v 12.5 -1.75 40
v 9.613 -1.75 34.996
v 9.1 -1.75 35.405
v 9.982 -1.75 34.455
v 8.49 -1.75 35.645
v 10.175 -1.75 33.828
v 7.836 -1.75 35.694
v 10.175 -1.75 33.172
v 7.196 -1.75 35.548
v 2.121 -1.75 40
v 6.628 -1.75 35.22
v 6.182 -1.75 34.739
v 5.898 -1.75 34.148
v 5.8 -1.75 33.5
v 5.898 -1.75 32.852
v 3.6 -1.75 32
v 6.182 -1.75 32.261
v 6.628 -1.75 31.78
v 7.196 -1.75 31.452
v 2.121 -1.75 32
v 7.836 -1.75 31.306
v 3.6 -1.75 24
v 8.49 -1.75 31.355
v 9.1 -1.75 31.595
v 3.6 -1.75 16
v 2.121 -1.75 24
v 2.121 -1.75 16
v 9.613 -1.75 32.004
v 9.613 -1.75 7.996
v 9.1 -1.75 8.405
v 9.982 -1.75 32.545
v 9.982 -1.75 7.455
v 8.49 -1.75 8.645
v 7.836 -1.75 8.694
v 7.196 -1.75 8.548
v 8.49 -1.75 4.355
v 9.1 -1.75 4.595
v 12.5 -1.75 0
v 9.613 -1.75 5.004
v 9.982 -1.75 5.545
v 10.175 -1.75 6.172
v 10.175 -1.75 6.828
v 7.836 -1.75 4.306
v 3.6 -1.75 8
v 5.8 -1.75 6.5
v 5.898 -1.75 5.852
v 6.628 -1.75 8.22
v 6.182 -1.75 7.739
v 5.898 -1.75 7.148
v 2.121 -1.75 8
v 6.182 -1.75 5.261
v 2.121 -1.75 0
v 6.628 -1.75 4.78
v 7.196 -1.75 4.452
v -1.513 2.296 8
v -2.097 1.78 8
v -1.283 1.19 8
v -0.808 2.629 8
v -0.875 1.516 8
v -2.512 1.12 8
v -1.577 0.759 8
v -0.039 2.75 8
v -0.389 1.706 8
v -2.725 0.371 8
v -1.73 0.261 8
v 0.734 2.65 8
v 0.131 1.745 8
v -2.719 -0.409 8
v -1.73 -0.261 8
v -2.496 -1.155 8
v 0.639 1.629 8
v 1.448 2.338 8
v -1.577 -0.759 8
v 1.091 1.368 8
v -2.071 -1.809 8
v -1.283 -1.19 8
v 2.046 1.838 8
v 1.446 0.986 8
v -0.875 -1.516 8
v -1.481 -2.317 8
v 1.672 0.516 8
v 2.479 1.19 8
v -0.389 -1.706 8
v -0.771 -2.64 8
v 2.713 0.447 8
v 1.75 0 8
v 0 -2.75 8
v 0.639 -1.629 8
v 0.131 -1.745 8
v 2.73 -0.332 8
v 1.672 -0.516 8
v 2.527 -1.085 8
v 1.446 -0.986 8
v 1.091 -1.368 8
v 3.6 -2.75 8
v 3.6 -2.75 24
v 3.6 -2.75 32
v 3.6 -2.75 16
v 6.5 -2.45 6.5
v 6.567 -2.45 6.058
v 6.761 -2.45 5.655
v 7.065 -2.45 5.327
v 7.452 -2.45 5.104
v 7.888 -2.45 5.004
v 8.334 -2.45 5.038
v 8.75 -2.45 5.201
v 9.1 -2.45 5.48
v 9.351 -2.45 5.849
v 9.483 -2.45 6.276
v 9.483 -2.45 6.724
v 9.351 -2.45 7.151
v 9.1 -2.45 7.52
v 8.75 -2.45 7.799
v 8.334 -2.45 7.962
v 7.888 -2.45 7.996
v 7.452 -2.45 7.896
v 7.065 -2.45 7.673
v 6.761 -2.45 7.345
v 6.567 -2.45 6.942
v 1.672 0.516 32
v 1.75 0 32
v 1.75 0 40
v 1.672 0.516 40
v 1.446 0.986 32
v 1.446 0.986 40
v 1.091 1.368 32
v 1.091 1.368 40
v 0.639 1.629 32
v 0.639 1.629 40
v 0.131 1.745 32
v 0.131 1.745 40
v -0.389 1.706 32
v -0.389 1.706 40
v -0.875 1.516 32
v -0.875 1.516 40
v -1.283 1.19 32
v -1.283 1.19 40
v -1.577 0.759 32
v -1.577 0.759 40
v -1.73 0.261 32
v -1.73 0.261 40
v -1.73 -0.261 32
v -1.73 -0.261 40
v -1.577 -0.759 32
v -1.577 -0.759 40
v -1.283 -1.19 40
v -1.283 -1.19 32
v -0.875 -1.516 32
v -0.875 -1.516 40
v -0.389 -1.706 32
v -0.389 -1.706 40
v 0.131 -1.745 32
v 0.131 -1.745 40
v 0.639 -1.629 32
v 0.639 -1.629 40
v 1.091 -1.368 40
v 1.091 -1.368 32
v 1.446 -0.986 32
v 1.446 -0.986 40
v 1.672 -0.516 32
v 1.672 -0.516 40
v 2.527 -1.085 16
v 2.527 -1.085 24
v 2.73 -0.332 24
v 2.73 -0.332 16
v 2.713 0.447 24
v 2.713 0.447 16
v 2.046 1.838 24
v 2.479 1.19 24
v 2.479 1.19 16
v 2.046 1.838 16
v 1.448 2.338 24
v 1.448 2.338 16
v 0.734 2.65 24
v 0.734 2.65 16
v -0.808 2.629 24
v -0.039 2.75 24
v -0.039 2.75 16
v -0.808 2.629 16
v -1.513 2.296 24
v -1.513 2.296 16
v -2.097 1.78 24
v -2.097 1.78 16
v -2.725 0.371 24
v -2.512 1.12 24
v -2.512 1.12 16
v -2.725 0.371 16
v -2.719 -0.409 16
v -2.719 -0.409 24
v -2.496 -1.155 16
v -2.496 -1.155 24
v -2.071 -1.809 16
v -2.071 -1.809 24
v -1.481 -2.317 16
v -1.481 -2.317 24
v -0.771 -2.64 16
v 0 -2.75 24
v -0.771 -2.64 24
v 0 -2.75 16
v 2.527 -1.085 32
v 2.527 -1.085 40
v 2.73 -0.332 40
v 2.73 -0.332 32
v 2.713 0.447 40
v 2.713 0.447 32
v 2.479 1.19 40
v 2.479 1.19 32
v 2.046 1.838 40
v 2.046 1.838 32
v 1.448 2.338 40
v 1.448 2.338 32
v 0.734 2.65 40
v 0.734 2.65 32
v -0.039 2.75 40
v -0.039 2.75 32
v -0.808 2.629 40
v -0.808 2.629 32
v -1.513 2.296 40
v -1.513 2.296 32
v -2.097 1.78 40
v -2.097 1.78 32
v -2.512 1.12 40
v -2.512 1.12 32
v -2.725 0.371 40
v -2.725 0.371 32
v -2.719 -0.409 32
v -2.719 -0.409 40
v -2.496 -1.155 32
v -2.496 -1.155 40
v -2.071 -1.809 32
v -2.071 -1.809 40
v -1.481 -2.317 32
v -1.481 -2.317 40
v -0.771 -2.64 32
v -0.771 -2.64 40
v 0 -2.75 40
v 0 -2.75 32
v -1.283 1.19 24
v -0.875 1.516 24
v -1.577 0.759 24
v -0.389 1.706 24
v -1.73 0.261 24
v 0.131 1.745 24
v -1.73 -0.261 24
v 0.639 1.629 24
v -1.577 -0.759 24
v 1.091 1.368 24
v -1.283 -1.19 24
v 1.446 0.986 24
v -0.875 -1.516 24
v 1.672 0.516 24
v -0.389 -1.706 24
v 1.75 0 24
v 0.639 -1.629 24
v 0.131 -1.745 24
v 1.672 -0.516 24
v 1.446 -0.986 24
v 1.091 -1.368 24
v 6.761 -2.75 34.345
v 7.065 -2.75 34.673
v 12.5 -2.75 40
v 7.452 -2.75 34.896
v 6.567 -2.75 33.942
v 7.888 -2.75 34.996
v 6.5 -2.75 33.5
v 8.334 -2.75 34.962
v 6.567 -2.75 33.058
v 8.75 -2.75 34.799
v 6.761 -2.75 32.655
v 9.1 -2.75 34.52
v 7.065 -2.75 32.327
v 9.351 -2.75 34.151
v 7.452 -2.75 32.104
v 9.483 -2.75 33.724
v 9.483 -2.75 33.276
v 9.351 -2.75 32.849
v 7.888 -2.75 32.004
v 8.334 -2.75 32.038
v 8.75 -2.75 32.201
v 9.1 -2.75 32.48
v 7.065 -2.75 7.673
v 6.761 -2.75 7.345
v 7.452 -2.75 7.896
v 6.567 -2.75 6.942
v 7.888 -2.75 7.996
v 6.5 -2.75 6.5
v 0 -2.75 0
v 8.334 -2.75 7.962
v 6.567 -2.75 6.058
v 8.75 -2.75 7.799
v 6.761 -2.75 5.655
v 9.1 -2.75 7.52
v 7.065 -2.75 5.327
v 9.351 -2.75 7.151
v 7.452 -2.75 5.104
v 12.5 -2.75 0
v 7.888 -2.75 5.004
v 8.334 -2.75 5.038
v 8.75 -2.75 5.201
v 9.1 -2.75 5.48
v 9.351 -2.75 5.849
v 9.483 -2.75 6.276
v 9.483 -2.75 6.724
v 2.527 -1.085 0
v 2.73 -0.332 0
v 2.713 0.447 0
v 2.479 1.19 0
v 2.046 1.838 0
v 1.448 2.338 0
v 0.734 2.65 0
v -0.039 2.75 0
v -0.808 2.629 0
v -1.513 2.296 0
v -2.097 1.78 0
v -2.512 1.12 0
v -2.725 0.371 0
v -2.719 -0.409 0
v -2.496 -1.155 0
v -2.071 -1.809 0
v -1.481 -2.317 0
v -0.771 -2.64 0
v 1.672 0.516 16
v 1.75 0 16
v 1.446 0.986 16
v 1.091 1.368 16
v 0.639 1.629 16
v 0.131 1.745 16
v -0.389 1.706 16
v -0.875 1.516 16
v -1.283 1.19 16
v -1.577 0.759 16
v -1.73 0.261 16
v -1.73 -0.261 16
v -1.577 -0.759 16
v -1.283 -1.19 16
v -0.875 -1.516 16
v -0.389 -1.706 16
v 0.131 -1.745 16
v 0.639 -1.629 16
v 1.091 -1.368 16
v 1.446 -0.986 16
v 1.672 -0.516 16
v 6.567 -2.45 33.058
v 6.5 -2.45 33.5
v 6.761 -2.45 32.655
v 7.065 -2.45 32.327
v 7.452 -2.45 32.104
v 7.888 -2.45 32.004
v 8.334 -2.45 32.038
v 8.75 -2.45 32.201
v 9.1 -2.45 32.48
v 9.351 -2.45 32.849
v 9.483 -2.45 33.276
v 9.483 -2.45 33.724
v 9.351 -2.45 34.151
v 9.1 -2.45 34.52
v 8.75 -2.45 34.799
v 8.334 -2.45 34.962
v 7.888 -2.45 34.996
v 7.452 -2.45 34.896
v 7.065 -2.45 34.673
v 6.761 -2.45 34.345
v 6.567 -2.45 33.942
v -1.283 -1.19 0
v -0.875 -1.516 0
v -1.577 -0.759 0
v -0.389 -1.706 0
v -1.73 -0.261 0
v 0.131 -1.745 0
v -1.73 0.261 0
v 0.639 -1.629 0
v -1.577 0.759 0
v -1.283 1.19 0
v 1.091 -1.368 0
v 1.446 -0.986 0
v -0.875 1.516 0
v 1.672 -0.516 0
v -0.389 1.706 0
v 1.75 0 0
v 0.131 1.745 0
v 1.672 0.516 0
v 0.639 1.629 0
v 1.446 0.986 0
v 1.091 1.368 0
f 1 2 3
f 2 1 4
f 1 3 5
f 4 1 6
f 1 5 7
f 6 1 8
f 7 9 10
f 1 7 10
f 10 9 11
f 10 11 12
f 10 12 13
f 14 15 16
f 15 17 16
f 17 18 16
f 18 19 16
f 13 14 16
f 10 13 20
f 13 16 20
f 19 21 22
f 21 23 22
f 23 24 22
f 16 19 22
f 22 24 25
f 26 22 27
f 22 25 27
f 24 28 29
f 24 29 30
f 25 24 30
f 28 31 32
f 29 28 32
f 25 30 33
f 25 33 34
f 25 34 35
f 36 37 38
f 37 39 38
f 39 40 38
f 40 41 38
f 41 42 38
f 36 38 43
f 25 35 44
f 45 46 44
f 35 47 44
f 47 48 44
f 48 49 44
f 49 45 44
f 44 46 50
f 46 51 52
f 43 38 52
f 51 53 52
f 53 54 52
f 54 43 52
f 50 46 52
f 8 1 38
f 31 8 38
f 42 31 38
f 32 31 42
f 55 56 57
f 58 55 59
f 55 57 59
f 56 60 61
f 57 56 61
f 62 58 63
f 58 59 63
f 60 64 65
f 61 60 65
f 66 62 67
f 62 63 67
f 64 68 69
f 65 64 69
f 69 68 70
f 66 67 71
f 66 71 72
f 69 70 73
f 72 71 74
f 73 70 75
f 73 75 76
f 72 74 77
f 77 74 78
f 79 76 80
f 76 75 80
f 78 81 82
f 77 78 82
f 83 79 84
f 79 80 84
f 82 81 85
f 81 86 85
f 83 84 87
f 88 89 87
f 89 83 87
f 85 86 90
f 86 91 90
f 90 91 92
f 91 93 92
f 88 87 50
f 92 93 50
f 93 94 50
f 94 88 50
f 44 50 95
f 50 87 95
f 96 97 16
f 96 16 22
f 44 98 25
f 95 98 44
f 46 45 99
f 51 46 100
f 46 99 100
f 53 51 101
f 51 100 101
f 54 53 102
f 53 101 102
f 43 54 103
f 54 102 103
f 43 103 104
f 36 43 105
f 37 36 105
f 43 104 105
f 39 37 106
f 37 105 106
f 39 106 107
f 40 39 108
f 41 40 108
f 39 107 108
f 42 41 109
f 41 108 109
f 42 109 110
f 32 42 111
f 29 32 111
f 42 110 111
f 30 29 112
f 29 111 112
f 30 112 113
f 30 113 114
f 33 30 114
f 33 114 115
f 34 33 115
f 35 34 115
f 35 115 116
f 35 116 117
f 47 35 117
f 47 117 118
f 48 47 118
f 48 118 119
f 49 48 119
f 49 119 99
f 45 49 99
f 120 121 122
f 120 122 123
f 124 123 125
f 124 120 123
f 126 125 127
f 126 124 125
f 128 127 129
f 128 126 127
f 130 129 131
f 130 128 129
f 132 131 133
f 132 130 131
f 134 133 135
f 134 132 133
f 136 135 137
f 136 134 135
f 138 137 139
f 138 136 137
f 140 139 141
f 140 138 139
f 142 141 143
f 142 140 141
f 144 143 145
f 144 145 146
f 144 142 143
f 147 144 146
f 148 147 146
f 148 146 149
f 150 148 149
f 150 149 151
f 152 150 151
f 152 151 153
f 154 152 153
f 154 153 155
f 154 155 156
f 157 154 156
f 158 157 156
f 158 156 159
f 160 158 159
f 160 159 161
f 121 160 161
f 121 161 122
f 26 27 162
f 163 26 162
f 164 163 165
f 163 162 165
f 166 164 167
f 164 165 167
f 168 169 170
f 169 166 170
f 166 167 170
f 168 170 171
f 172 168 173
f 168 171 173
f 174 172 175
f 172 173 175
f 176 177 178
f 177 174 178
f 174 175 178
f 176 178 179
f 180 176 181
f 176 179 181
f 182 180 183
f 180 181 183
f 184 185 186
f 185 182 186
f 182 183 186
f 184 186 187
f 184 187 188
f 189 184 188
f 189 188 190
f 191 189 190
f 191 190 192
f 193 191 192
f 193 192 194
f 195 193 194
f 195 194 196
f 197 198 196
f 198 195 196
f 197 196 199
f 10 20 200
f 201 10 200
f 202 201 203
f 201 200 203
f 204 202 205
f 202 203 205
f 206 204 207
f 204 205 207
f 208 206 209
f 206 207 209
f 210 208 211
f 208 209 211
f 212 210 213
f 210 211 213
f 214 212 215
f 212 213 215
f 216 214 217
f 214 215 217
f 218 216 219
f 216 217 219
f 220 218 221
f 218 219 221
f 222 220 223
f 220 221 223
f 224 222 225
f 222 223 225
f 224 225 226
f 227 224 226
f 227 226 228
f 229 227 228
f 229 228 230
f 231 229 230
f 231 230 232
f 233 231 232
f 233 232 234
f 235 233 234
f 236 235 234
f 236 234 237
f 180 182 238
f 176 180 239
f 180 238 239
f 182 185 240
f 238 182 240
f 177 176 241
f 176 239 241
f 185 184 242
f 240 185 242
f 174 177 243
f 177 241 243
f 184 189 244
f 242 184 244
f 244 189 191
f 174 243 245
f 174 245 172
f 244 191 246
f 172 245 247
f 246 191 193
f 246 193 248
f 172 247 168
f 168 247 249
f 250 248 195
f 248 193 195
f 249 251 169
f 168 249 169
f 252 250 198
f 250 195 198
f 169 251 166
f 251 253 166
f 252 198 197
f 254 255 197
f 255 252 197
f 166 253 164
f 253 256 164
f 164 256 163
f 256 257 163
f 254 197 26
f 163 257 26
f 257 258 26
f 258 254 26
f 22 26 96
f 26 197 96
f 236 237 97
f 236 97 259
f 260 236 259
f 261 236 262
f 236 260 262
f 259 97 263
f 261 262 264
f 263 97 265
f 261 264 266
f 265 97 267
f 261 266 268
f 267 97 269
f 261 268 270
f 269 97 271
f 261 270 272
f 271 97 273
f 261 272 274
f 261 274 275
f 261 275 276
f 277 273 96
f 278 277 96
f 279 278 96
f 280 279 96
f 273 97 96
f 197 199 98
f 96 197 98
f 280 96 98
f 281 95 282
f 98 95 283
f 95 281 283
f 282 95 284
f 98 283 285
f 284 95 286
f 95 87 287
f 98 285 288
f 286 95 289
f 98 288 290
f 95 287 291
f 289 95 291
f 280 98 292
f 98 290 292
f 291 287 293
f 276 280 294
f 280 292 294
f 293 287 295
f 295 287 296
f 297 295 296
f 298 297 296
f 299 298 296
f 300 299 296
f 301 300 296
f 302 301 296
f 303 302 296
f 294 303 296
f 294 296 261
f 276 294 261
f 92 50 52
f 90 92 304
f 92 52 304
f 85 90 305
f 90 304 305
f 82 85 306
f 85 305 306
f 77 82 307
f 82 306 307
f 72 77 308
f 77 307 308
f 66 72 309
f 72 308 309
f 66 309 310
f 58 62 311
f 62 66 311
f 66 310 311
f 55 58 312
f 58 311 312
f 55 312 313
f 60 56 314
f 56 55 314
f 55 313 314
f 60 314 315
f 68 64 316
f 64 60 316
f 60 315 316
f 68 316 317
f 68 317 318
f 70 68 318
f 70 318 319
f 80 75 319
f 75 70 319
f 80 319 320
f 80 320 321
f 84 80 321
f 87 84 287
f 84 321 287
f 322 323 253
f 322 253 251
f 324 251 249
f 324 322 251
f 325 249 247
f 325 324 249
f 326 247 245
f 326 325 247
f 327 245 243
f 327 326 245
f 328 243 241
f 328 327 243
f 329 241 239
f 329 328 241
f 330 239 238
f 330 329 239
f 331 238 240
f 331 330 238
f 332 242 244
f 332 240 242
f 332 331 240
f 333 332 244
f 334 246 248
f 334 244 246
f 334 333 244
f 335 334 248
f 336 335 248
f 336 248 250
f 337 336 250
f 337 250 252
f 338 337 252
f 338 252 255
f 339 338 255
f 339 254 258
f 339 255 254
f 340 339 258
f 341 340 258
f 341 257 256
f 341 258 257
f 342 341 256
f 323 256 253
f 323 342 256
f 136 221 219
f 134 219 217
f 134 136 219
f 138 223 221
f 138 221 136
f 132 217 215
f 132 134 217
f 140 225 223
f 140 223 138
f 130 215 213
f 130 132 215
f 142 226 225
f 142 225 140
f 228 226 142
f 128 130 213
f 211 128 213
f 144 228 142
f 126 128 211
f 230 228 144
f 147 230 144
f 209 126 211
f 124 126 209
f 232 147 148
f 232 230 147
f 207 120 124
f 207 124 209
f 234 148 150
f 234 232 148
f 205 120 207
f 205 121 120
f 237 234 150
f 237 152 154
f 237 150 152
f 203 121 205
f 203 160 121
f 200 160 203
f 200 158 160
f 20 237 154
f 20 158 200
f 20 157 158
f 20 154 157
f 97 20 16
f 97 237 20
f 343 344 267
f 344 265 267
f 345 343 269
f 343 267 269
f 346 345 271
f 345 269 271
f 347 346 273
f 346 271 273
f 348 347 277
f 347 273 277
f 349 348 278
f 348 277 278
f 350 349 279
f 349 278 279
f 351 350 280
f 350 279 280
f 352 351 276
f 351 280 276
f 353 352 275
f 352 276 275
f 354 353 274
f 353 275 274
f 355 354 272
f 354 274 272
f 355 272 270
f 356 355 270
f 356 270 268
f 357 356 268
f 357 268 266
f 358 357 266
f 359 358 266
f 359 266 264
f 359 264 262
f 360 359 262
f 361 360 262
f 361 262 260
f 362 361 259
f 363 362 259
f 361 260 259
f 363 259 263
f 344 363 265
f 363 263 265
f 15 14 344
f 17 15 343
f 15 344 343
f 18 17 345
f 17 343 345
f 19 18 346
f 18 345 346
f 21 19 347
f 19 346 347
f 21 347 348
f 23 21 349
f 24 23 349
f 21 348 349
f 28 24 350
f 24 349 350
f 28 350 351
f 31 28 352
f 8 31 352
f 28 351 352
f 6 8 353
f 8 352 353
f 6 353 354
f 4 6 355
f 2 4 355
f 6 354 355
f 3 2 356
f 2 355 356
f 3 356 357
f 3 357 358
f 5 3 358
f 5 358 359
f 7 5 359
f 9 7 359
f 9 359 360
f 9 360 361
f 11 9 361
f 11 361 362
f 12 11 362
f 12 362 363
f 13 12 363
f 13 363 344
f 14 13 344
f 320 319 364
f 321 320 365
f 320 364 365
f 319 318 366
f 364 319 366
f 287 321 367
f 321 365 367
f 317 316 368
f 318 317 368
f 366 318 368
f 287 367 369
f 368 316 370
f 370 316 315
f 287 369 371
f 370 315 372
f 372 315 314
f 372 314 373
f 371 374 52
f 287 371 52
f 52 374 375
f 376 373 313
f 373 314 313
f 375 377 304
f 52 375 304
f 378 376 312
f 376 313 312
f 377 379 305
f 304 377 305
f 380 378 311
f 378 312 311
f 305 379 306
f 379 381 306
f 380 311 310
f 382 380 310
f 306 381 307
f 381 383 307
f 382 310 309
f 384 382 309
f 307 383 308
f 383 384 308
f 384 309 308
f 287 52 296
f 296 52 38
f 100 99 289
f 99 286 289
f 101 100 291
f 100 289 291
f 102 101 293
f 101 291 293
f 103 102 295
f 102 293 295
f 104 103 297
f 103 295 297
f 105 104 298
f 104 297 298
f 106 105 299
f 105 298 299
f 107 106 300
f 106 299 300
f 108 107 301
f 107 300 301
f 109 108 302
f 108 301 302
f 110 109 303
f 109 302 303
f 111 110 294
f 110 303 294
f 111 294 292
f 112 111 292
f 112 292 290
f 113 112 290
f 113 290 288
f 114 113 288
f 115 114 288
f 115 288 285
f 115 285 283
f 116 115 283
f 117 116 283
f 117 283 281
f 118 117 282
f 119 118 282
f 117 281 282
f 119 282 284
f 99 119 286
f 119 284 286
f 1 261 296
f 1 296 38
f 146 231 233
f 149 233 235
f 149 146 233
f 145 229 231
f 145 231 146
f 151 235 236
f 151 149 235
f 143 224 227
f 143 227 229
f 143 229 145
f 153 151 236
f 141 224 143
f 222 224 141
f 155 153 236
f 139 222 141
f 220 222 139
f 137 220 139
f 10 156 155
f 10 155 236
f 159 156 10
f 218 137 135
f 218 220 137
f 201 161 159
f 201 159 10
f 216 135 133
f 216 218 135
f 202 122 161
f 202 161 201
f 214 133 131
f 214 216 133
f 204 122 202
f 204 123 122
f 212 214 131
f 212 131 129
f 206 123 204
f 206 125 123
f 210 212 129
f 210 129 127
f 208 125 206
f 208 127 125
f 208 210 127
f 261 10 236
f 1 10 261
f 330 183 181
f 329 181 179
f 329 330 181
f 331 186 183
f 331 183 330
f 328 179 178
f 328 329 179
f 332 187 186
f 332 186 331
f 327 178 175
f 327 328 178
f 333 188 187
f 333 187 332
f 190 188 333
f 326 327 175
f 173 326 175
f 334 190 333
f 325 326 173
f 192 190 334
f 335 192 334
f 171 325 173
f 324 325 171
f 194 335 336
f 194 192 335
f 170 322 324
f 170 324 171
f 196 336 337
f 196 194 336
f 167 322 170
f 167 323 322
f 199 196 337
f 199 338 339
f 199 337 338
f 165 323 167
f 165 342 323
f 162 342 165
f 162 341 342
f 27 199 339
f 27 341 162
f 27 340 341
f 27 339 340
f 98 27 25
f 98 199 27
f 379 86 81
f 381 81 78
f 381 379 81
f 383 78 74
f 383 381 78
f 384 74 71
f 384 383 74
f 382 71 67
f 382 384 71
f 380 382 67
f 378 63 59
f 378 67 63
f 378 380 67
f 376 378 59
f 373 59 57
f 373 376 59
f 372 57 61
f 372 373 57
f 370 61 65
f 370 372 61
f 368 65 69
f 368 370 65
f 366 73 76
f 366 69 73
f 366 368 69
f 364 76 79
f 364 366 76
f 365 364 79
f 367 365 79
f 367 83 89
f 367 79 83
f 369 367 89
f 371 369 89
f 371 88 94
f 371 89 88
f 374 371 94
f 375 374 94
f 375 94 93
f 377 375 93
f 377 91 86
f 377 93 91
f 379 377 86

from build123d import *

# Parameters (mm, degrees)
ESQUISSE1_R                  = 1.75
BOSS_EXTRU_1_DEPTH           = 40
ENL_V_MAT_EXTRU_3_DEPTH      = 20
ENL_V_MAT_EXTRU_3_DEPTH_BACK = 20
ESQUISSE2_W                  = 17.8
ESQUISSE2_H                  = 8
D_GAGEMENT_M31_D             = 3
D_GAGEMENT_M31_DEPTH         = 10
D_GAGEMENT_M31_CSINK_D       = 4.4
D_GAGEMENT_M31_CSINK_ANGLE   = 90
D_GAGEMENT_M31_TIP           = 0.901290929


with BuildPart() as part:
    # Esquisse1 → Boss.-Extru.1 (new body)
    with BuildSketch(Plane.XY):
        with BuildLine():
            Line((12.5, -1.75), (2.121320344, -1.75))
            ThreePointArc((2.121320344, -1.75), (-1.17260394, 2.487468593), (0, -2.75))
            Line((0, -2.75), (12.5, -2.75))
            Line((12.5, -2.75), (12.5, -1.75))
        make_face()
        Circle(ESQUISSE1_R, mode=Mode.SUBTRACT)
    extrude(amount=BOSS_EXTRU_1_DEPTH)

    # Esquisse2 → Enlèv. mat.-Extru.3 (cut, two sides: drawn at the far end of the back side and taken through both)
    with BuildSketch(Plane(origin=(0, -1.75, 0), x_dir=(1, 0, 0), z_dir=(0, 1, 0)).offset(-ENL_V_MAT_EXTRU_3_DEPTH_BACK)):
        with Locations((-5.3, -12)):
            Rectangle(ESQUISSE2_W, ESQUISSE2_H)
        with Locations((-5.3, -28)):
            Rectangle(ESQUISSE2_W, ESQUISSE2_H)
    extrude(amount=ENL_V_MAT_EXTRU_3_DEPTH + ENL_V_MAT_EXTRU_3_DEPTH_BACK, mode=Mode.SUBTRACT)

    # Dégagement M31
    with Locations(Plane(origin=(0, -1.75, 0), x_dir=(1, 0, 0), z_dir=(0, 1, 0))):
        with Locations((8, -33.5), (8, -6.5)):
            CounterSinkHole(D_GAGEMENT_M31_D / 2, D_GAGEMENT_M31_CSINK_D / 2, depth=D_GAGEMENT_M31_DEPTH, counter_sink_angle=D_GAGEMENT_M31_CSINK_ANGLE)
            with Locations((0, 0, -(D_GAGEMENT_M31_DEPTH + D_GAGEMENT_M31_TIP / 2))):  # 118° drill point
                Cone(0, D_GAGEMENT_M31_D / 2, D_GAGEMENT_M31_TIP, mode=Mode.SUBTRACT)


solid = part.part
